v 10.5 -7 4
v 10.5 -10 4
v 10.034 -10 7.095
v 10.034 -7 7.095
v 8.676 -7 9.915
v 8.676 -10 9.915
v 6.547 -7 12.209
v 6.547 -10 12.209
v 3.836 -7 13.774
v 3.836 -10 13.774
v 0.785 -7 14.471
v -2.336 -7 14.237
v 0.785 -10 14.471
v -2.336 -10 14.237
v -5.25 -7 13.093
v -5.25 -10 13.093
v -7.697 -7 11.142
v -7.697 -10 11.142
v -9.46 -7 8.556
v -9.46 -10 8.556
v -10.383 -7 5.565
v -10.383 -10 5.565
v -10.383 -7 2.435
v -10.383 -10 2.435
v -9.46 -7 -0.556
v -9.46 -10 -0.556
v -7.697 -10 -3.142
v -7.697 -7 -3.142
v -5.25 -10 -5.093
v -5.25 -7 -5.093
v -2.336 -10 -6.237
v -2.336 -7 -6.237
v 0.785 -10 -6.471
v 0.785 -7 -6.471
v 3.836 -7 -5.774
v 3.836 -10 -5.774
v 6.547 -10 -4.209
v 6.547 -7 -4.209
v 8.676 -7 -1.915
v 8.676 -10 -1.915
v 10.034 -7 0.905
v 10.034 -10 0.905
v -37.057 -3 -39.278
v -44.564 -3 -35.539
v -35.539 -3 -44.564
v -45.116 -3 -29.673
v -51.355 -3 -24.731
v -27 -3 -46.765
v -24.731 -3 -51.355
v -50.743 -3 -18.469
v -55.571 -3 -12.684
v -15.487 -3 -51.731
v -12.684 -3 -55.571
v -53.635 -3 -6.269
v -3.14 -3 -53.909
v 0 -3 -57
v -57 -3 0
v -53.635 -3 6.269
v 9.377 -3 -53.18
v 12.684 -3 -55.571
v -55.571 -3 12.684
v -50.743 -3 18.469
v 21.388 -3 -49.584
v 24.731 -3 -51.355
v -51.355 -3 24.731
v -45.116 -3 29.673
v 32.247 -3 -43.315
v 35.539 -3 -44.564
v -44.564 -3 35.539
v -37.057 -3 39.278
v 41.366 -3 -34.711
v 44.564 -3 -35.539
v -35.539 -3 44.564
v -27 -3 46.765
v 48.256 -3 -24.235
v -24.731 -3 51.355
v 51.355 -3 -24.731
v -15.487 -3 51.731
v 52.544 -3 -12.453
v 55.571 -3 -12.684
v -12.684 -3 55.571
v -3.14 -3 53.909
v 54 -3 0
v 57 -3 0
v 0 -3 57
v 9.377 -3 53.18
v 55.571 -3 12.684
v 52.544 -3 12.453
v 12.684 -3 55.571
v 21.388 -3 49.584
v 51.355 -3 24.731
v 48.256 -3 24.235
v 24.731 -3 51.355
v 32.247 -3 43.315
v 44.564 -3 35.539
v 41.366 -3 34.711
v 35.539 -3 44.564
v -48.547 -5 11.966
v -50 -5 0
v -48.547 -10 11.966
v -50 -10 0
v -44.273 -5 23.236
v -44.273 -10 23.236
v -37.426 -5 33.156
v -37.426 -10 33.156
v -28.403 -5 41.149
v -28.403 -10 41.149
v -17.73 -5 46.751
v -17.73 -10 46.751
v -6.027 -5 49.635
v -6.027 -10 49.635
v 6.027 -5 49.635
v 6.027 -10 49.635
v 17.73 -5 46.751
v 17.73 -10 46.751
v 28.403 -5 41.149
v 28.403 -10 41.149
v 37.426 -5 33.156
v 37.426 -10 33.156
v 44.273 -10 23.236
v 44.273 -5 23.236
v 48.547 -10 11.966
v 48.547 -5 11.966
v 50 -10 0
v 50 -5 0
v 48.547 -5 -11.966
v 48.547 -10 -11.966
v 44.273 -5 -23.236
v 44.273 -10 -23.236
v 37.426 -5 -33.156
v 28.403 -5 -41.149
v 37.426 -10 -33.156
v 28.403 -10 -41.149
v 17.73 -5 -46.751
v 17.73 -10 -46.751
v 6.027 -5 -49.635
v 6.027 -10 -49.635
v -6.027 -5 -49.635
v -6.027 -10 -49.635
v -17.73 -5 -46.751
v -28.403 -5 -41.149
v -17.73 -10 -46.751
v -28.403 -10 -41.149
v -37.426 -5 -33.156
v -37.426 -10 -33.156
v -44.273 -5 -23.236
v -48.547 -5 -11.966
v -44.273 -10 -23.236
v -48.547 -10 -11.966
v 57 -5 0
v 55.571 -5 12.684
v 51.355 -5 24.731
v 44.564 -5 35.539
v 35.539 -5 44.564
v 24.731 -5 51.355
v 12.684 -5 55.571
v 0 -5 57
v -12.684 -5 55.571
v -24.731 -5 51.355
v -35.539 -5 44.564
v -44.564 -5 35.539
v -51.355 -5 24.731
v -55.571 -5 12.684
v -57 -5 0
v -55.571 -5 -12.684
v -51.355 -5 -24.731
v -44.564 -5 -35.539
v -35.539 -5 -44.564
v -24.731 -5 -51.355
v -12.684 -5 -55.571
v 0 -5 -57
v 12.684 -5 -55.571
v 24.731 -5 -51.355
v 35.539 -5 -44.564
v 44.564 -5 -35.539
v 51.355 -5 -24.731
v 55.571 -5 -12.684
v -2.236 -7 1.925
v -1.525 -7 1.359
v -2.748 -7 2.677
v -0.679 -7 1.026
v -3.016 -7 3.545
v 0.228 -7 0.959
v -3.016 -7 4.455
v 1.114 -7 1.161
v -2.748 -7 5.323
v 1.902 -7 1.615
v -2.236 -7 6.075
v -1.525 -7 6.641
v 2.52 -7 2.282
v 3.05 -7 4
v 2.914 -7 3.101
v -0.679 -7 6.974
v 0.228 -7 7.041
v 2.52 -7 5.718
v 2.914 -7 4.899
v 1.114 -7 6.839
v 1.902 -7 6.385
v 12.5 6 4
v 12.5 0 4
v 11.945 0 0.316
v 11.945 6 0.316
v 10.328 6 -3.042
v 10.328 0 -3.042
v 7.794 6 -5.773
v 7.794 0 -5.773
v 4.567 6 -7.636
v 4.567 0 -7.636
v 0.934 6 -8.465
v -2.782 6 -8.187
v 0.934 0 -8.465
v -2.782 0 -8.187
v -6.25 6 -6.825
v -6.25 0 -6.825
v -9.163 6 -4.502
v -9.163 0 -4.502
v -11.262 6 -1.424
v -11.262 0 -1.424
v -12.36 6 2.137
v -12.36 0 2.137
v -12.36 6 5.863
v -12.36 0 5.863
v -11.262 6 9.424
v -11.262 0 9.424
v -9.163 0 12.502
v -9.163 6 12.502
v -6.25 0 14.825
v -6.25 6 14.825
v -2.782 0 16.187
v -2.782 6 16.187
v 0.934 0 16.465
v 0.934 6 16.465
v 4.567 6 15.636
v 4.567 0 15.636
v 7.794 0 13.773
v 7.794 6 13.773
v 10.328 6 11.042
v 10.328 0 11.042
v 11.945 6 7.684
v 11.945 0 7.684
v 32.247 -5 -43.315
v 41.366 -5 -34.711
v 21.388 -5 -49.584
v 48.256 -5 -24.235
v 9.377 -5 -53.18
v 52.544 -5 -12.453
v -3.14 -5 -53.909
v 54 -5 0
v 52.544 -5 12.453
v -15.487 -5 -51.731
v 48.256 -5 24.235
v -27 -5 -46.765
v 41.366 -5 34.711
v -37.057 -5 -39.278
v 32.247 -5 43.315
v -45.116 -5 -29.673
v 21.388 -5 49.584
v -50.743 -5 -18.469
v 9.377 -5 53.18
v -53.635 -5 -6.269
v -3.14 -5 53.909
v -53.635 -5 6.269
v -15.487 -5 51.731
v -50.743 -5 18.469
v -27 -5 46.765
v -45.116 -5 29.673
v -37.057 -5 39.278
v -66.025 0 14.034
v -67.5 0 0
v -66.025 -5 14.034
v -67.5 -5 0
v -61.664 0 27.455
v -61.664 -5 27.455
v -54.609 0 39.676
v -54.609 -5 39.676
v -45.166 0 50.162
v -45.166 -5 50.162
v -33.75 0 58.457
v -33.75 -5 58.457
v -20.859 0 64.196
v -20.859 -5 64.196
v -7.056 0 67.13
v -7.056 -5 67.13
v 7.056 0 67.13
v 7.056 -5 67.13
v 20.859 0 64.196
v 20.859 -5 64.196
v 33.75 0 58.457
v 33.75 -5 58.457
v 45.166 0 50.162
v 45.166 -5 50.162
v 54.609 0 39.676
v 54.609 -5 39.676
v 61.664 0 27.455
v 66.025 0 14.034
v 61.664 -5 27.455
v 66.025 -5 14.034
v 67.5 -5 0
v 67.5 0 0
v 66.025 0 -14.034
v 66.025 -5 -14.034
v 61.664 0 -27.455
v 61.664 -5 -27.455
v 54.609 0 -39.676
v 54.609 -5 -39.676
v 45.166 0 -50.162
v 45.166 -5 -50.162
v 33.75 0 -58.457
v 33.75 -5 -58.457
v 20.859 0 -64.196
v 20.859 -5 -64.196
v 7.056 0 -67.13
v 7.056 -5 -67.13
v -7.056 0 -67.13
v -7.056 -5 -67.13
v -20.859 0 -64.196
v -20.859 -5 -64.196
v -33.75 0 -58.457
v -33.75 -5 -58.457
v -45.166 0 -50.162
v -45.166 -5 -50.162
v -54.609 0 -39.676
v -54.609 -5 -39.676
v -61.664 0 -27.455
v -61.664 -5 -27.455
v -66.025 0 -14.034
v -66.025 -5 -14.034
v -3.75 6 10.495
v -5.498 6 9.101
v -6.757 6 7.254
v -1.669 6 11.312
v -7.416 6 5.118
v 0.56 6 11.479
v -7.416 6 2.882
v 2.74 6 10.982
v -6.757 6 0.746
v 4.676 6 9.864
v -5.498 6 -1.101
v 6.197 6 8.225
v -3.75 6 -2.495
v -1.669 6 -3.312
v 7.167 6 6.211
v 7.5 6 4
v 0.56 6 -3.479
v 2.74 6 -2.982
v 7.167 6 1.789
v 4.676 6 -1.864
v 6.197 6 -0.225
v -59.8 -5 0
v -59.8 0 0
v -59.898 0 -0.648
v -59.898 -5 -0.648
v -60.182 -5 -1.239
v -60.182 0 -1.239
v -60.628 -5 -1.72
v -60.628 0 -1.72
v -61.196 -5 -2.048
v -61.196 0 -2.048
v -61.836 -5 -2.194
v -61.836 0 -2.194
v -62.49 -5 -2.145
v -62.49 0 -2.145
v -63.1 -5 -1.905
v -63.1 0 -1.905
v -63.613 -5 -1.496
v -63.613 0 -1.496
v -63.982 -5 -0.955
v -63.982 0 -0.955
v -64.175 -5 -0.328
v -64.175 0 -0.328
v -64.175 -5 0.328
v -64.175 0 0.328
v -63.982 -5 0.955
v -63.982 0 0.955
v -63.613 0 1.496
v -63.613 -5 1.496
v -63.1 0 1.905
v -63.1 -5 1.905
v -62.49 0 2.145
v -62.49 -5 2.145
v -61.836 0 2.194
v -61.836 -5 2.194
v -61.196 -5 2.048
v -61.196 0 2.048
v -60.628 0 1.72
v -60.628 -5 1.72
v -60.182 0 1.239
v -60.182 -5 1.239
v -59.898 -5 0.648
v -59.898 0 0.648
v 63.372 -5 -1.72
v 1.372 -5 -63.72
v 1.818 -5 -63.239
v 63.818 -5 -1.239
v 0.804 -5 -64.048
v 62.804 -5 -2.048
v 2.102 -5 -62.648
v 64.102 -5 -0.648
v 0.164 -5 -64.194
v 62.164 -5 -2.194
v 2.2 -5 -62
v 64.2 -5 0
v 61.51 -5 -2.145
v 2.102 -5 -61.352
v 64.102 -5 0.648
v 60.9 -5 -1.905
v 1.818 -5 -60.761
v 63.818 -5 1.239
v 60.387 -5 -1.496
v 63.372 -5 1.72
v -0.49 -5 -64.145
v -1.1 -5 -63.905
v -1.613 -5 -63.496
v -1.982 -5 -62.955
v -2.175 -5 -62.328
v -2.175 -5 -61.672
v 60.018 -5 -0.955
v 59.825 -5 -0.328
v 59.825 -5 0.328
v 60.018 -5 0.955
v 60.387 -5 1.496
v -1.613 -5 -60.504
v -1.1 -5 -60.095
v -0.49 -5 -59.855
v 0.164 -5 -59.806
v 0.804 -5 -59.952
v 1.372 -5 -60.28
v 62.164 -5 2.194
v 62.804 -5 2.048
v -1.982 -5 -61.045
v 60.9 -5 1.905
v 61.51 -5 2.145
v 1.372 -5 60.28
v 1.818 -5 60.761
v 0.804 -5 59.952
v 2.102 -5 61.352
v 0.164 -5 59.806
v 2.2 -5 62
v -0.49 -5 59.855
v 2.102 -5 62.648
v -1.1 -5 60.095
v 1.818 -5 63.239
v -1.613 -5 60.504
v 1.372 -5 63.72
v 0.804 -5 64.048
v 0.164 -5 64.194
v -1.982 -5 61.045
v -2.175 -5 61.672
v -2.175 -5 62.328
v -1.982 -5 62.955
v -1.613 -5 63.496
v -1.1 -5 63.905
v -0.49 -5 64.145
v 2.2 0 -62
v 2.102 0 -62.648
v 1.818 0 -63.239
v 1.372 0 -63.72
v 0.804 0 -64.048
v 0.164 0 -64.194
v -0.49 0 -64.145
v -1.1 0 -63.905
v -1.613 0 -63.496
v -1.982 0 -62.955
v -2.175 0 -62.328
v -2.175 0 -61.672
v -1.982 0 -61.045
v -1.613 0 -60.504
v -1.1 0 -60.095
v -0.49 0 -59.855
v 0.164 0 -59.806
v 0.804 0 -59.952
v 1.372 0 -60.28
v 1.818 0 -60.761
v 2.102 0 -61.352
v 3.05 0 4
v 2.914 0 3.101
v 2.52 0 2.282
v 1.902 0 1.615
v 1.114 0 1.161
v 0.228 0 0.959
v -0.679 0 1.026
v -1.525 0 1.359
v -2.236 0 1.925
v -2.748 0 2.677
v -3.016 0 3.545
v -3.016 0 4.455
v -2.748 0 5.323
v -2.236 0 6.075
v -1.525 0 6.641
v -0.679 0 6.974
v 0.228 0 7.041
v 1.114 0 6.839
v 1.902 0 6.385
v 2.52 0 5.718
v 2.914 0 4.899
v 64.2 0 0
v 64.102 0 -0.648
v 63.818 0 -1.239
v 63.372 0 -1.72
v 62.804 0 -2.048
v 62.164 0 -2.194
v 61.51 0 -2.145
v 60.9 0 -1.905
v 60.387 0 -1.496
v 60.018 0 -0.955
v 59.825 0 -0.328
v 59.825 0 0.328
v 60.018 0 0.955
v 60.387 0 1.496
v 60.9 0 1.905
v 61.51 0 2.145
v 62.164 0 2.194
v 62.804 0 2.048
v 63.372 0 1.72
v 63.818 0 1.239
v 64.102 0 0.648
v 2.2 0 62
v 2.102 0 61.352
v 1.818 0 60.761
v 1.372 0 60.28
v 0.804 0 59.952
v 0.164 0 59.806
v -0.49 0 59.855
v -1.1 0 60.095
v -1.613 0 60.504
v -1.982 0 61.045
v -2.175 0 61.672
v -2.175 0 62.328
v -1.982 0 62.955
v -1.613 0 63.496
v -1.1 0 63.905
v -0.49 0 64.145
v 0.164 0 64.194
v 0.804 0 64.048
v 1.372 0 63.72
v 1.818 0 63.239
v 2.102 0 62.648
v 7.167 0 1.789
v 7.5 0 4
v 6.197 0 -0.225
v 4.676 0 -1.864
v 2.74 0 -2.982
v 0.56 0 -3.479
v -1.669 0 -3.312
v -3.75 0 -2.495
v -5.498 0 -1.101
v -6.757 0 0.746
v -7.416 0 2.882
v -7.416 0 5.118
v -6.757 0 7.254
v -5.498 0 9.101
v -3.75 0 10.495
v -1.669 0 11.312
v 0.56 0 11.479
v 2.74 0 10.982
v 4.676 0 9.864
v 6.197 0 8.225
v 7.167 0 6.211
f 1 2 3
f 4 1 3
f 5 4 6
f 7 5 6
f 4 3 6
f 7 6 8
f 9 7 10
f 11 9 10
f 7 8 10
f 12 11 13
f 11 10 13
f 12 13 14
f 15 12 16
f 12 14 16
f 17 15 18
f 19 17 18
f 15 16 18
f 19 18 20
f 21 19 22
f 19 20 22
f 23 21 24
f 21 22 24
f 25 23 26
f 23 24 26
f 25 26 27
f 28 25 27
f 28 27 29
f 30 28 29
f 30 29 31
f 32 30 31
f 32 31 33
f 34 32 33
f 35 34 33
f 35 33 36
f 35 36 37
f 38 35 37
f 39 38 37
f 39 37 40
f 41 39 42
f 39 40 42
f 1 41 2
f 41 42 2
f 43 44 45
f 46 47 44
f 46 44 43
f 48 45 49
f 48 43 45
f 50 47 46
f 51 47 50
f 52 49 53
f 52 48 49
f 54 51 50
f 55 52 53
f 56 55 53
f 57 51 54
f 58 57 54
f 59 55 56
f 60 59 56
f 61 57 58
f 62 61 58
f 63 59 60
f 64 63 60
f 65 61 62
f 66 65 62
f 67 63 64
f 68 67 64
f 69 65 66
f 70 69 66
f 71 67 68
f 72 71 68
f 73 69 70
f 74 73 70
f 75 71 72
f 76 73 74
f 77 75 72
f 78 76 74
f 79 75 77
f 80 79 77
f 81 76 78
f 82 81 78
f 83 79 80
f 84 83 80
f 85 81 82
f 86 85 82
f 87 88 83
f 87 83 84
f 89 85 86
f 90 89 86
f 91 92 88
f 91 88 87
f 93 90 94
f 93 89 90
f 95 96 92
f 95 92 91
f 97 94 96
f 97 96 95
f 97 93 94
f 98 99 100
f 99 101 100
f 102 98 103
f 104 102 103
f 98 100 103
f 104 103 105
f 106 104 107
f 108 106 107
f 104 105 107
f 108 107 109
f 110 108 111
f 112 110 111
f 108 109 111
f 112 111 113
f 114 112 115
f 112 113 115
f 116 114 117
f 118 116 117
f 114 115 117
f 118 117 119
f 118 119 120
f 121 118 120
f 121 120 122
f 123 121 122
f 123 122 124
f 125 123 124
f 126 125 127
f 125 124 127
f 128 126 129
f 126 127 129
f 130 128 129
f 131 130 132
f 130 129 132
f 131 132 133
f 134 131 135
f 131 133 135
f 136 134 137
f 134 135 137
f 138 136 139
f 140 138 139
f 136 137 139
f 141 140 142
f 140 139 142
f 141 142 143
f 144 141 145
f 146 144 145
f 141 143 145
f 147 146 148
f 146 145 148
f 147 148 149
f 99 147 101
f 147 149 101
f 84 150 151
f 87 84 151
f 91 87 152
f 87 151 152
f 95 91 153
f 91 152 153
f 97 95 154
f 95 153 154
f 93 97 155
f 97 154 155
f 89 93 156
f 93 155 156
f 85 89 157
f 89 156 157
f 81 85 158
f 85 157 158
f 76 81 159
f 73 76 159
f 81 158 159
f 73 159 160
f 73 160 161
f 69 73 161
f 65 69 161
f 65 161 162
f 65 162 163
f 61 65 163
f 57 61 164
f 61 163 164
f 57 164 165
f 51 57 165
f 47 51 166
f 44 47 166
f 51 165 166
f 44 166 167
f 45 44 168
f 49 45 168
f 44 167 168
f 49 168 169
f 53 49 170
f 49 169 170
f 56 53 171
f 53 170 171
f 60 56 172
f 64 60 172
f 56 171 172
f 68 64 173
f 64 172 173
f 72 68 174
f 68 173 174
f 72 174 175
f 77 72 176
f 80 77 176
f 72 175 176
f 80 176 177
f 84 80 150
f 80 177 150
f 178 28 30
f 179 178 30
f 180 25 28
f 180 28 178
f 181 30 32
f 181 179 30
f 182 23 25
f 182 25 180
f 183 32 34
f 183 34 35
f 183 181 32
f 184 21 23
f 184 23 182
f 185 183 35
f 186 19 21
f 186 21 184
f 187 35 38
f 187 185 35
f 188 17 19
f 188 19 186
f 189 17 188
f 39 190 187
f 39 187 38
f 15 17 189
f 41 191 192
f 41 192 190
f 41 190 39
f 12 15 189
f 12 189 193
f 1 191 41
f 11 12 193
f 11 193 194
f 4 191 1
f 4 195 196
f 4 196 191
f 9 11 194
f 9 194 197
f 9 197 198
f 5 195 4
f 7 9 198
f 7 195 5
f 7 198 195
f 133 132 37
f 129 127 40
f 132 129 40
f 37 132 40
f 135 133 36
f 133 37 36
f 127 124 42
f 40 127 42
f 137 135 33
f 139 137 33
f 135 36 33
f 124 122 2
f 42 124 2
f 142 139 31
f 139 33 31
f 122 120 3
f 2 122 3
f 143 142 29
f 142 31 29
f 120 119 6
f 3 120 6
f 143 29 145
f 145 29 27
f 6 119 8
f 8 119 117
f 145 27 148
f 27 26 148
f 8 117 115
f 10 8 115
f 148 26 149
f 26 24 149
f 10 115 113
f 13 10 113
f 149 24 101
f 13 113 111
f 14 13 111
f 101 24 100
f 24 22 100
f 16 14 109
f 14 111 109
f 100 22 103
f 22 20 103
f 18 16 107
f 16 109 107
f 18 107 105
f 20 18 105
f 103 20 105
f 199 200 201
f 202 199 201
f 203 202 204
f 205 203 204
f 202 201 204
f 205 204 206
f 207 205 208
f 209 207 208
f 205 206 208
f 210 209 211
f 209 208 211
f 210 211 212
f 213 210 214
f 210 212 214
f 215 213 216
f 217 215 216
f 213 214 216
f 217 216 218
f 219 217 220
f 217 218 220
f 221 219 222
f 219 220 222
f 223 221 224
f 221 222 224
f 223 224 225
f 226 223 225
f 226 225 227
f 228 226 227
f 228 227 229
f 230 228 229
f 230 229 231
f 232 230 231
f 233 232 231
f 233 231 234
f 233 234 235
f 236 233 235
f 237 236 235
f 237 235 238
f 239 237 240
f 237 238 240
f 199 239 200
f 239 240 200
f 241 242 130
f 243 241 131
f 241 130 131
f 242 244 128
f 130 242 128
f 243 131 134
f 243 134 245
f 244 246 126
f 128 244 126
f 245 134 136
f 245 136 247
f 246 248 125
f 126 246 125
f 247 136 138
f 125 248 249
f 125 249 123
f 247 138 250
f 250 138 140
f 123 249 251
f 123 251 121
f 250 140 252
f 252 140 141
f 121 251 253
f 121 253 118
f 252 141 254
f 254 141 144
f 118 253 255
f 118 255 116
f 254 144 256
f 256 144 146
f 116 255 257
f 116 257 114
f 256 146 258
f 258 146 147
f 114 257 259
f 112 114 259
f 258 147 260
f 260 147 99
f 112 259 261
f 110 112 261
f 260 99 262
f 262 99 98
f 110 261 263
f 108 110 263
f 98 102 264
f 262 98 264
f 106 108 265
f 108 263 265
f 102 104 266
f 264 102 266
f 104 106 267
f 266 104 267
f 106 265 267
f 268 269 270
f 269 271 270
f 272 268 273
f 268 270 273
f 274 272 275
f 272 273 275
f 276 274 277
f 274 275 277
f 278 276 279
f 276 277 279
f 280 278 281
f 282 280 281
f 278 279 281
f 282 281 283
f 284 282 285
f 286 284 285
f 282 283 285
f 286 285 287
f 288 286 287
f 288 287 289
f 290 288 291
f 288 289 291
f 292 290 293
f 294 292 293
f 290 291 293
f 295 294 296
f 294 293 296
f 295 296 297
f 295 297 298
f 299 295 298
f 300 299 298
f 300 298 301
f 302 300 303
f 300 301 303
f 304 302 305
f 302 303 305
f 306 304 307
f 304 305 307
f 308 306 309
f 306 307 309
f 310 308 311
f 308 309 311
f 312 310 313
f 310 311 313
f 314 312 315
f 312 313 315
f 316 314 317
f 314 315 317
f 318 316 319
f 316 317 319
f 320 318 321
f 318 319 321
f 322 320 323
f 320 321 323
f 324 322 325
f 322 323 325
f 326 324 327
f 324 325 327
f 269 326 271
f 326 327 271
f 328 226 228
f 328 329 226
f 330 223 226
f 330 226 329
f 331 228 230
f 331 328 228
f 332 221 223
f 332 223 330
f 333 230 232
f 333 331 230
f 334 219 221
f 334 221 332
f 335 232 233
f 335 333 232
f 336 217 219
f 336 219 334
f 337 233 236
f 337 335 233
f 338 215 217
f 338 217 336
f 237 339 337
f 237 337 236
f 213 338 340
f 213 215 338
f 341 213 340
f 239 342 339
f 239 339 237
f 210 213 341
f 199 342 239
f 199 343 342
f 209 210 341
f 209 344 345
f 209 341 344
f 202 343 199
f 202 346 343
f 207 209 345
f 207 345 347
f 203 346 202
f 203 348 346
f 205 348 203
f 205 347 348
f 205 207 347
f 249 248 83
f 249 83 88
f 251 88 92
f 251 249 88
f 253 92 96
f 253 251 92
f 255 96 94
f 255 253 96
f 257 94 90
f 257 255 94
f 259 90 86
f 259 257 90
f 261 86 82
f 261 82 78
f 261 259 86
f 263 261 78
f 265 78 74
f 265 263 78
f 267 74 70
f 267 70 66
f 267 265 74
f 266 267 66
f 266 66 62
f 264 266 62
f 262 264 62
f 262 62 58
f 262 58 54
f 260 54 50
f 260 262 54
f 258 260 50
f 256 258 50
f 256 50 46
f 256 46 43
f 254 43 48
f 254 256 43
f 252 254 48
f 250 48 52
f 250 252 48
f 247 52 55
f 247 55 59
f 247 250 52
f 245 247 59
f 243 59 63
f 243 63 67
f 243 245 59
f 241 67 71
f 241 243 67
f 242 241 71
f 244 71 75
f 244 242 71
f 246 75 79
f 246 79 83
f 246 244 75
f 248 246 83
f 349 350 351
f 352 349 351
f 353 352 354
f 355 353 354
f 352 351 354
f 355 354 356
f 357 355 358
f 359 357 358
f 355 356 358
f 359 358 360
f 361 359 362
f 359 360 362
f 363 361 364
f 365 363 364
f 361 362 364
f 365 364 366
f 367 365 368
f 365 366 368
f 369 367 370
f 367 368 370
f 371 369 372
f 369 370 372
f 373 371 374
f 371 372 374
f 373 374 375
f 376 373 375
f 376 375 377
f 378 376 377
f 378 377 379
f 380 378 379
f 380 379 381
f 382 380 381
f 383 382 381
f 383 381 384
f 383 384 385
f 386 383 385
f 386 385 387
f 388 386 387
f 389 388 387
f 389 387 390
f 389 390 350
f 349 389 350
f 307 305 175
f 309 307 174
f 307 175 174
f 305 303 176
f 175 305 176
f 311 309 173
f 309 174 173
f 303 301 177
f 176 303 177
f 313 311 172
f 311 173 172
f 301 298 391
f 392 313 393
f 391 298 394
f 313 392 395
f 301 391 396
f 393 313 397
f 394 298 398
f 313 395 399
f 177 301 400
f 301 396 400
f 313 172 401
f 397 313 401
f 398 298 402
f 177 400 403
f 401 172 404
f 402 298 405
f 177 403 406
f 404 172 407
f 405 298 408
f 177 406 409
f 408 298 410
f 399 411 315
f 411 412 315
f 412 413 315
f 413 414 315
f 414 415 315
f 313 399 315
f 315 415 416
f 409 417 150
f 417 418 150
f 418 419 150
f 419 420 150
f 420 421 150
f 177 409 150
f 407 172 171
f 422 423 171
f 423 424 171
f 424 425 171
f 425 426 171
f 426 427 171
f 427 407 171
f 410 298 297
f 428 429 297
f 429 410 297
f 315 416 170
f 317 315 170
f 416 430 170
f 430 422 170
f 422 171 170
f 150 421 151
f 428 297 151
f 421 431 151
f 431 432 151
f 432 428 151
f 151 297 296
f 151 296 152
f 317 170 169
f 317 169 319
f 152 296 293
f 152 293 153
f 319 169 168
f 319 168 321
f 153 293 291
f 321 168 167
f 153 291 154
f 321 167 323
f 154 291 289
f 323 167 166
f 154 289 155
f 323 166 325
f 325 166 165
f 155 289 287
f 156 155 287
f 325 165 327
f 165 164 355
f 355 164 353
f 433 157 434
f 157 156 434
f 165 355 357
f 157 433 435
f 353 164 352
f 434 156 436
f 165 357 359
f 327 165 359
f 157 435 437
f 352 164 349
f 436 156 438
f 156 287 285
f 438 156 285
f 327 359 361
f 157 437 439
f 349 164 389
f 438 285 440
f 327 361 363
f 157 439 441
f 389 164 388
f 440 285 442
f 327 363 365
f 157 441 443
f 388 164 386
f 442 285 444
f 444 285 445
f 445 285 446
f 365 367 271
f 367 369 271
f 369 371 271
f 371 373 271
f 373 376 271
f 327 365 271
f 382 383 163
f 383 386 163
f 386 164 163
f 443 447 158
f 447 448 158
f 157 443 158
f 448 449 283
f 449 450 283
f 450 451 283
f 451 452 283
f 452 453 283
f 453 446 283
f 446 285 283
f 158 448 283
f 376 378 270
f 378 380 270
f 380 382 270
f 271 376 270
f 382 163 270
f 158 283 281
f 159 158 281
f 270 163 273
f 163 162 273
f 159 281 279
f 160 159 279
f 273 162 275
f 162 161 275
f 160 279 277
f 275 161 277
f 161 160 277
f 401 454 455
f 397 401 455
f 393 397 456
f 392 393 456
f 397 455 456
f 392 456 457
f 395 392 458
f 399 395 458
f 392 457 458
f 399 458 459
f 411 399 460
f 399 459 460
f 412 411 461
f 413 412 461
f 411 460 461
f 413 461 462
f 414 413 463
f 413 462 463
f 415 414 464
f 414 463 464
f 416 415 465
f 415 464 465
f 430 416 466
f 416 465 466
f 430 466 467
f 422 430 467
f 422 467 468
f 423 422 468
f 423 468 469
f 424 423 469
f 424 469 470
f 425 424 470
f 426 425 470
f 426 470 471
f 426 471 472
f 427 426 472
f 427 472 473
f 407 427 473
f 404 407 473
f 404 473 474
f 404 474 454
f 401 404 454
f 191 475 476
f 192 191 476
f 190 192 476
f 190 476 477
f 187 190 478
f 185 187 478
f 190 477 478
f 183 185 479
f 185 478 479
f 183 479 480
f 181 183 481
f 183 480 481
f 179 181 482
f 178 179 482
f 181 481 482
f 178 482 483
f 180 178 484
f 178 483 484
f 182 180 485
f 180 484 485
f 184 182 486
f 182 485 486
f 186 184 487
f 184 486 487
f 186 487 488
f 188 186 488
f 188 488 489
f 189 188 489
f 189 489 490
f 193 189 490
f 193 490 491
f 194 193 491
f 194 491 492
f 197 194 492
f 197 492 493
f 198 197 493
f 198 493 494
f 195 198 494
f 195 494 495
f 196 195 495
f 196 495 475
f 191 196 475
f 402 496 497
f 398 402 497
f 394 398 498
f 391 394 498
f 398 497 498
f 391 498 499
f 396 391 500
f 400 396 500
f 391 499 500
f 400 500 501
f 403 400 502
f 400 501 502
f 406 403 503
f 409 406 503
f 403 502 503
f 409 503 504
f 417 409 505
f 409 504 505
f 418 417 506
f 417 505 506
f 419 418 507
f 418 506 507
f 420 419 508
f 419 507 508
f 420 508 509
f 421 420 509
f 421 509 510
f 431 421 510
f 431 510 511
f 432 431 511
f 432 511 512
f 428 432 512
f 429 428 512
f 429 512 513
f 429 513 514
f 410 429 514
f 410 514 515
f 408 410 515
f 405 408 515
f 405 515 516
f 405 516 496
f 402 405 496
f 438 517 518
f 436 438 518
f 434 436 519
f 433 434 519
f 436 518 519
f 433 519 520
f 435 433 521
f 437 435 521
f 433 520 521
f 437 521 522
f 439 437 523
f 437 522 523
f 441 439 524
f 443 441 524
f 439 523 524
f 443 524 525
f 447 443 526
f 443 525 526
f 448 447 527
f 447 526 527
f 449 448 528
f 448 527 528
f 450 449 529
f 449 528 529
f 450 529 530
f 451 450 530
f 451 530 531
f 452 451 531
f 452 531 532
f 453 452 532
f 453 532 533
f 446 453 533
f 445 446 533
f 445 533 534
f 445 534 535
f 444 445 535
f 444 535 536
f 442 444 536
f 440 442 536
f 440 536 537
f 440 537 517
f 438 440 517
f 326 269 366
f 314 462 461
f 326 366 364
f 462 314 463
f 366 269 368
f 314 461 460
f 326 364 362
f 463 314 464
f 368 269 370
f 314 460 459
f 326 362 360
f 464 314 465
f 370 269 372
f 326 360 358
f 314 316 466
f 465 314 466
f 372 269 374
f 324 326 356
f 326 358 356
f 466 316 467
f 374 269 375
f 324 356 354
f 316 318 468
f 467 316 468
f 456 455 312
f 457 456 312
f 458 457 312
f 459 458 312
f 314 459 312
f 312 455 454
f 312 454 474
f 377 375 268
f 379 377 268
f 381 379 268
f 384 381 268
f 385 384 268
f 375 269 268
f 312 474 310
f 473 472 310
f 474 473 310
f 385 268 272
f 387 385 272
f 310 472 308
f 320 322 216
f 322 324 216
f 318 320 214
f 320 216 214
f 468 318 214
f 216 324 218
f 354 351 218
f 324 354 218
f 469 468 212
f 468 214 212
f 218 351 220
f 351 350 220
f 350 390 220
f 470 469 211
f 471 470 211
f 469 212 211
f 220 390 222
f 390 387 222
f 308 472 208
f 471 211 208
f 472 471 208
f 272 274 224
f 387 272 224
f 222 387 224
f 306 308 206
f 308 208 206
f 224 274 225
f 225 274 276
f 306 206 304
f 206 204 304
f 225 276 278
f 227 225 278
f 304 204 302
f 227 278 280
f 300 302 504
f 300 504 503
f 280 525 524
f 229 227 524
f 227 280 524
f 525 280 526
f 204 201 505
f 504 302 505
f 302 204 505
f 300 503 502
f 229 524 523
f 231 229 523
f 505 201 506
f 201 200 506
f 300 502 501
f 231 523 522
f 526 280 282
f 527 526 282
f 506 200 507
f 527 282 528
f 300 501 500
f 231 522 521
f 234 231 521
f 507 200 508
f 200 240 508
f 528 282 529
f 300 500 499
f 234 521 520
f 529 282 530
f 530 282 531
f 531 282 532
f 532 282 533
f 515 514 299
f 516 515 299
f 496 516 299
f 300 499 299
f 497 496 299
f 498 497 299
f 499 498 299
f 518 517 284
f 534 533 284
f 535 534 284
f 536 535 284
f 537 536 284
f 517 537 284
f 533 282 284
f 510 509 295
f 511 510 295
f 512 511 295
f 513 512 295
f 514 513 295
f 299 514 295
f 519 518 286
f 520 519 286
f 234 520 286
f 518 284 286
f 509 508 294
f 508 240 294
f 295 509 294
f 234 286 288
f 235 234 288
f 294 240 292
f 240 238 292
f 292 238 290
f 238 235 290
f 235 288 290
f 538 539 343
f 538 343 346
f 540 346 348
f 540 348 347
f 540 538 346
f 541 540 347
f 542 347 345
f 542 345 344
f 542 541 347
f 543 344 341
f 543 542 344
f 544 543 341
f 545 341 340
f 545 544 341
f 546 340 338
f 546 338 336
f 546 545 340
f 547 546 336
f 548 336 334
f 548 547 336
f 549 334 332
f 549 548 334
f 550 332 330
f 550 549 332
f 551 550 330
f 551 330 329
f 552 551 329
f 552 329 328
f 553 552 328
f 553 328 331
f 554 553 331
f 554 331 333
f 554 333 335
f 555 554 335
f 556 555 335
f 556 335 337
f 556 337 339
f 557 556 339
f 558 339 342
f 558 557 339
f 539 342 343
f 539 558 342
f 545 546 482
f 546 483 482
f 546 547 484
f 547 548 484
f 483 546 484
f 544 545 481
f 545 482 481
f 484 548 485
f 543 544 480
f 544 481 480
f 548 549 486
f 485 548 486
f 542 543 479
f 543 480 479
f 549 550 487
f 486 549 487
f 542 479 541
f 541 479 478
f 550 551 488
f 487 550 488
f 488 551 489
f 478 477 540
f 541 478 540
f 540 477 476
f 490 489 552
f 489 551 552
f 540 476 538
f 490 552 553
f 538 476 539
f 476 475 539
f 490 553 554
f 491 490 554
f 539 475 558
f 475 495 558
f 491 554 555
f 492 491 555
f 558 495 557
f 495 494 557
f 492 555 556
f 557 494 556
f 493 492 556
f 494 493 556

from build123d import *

# Parameters (mm, degrees)
SKETCH2_R           = 12.5
SKETCH2_R_2         = 7.5
BOSS_EXTRUDE1_DEPTH = 6
SKETCH3_R           = 10.5
CUT_EXTRUDE1_DEPTH  = 3
SKETCH4_R           = 3.05
CUT_EXTRUDE2_DEPTH  = 11
SKETCH5_R           = 2.2
CUT_EXTRUDE3_DEPTH  = 11
SKETCH6_R           = 57
SKETCH6_R_2         = 54
CUT_EXTRUDE4_DEPTH  = 2


with BuildPart() as part:
    # Sketch1 → Revolve1 (revolve)
    with BuildSketch(Plane.XY):
        Polygon((0, 0), (-67.5, 0), (-67.5, -5), (-50, -5), (-50, -10), (0, -10), align=None)
    revolve(axis=Axis((0, -10, 0), (0, 1, 0)))

    # Sketch2 → Boss-Extrude1 (add)
    with BuildSketch(Plane(origin=(0, 0, 0), x_dir=(1, 0, 0), z_dir=(0, 1, 0))):
        with Locations((0, -4)):
            Circle(SKETCH2_R)
        with Locations((0, -4)):
            Circle(SKETCH2_R_2, mode=Mode.SUBTRACT)
    extrude(amount=BOSS_EXTRUDE1_DEPTH)

    # Sketch3 → Cut-Extrude1 (cut)
    with BuildSketch(Plane.XZ.offset(10)):
        with Locations((0, 4)):
            Circle(SKETCH3_R)
    extrude(amount=-CUT_EXTRUDE1_DEPTH, mode=Mode.SUBTRACT)

    # Sketch4 → Cut-Extrude2 (cut, through all)
    with BuildSketch(Plane(origin=(0, 0, 0), x_dir=(1, 0, 0), z_dir=(0, 1, 0))):
        with Locations((0, -4)):
            Circle(SKETCH4_R)
    extrude(amount=-CUT_EXTRUDE2_DEPTH, mode=Mode.SUBTRACT)

    # Sketch5 → Cut-Extrude3 (cut, through all)
    with BuildSketch(Plane(origin=(0, 0, 0), x_dir=(1, 0, 0), z_dir=(0, 1, 0))):
        with Locations((0, 62)):
            Circle(SKETCH5_R)
        with Locations((62, 0)):
            Circle(SKETCH5_R)
        with Locations((0, -62)):
            Circle(SKETCH5_R)
        with Locations((-62, 0)):
            Circle(SKETCH5_R)
    extrude(amount=-CUT_EXTRUDE3_DEPTH, mode=Mode.SUBTRACT)

    # Sketch6 → Cut-Extrude4 (cut)
    with BuildSketch(Plane.XZ.offset(5)):
        Circle(SKETCH6_R)
        Circle(SKETCH6_R_2, mode=Mode.SUBTRACT)
    extrude(amount=-CUT_EXTRUDE4_DEPTH, mode=Mode.SUBTRACT)


solid = part.part
